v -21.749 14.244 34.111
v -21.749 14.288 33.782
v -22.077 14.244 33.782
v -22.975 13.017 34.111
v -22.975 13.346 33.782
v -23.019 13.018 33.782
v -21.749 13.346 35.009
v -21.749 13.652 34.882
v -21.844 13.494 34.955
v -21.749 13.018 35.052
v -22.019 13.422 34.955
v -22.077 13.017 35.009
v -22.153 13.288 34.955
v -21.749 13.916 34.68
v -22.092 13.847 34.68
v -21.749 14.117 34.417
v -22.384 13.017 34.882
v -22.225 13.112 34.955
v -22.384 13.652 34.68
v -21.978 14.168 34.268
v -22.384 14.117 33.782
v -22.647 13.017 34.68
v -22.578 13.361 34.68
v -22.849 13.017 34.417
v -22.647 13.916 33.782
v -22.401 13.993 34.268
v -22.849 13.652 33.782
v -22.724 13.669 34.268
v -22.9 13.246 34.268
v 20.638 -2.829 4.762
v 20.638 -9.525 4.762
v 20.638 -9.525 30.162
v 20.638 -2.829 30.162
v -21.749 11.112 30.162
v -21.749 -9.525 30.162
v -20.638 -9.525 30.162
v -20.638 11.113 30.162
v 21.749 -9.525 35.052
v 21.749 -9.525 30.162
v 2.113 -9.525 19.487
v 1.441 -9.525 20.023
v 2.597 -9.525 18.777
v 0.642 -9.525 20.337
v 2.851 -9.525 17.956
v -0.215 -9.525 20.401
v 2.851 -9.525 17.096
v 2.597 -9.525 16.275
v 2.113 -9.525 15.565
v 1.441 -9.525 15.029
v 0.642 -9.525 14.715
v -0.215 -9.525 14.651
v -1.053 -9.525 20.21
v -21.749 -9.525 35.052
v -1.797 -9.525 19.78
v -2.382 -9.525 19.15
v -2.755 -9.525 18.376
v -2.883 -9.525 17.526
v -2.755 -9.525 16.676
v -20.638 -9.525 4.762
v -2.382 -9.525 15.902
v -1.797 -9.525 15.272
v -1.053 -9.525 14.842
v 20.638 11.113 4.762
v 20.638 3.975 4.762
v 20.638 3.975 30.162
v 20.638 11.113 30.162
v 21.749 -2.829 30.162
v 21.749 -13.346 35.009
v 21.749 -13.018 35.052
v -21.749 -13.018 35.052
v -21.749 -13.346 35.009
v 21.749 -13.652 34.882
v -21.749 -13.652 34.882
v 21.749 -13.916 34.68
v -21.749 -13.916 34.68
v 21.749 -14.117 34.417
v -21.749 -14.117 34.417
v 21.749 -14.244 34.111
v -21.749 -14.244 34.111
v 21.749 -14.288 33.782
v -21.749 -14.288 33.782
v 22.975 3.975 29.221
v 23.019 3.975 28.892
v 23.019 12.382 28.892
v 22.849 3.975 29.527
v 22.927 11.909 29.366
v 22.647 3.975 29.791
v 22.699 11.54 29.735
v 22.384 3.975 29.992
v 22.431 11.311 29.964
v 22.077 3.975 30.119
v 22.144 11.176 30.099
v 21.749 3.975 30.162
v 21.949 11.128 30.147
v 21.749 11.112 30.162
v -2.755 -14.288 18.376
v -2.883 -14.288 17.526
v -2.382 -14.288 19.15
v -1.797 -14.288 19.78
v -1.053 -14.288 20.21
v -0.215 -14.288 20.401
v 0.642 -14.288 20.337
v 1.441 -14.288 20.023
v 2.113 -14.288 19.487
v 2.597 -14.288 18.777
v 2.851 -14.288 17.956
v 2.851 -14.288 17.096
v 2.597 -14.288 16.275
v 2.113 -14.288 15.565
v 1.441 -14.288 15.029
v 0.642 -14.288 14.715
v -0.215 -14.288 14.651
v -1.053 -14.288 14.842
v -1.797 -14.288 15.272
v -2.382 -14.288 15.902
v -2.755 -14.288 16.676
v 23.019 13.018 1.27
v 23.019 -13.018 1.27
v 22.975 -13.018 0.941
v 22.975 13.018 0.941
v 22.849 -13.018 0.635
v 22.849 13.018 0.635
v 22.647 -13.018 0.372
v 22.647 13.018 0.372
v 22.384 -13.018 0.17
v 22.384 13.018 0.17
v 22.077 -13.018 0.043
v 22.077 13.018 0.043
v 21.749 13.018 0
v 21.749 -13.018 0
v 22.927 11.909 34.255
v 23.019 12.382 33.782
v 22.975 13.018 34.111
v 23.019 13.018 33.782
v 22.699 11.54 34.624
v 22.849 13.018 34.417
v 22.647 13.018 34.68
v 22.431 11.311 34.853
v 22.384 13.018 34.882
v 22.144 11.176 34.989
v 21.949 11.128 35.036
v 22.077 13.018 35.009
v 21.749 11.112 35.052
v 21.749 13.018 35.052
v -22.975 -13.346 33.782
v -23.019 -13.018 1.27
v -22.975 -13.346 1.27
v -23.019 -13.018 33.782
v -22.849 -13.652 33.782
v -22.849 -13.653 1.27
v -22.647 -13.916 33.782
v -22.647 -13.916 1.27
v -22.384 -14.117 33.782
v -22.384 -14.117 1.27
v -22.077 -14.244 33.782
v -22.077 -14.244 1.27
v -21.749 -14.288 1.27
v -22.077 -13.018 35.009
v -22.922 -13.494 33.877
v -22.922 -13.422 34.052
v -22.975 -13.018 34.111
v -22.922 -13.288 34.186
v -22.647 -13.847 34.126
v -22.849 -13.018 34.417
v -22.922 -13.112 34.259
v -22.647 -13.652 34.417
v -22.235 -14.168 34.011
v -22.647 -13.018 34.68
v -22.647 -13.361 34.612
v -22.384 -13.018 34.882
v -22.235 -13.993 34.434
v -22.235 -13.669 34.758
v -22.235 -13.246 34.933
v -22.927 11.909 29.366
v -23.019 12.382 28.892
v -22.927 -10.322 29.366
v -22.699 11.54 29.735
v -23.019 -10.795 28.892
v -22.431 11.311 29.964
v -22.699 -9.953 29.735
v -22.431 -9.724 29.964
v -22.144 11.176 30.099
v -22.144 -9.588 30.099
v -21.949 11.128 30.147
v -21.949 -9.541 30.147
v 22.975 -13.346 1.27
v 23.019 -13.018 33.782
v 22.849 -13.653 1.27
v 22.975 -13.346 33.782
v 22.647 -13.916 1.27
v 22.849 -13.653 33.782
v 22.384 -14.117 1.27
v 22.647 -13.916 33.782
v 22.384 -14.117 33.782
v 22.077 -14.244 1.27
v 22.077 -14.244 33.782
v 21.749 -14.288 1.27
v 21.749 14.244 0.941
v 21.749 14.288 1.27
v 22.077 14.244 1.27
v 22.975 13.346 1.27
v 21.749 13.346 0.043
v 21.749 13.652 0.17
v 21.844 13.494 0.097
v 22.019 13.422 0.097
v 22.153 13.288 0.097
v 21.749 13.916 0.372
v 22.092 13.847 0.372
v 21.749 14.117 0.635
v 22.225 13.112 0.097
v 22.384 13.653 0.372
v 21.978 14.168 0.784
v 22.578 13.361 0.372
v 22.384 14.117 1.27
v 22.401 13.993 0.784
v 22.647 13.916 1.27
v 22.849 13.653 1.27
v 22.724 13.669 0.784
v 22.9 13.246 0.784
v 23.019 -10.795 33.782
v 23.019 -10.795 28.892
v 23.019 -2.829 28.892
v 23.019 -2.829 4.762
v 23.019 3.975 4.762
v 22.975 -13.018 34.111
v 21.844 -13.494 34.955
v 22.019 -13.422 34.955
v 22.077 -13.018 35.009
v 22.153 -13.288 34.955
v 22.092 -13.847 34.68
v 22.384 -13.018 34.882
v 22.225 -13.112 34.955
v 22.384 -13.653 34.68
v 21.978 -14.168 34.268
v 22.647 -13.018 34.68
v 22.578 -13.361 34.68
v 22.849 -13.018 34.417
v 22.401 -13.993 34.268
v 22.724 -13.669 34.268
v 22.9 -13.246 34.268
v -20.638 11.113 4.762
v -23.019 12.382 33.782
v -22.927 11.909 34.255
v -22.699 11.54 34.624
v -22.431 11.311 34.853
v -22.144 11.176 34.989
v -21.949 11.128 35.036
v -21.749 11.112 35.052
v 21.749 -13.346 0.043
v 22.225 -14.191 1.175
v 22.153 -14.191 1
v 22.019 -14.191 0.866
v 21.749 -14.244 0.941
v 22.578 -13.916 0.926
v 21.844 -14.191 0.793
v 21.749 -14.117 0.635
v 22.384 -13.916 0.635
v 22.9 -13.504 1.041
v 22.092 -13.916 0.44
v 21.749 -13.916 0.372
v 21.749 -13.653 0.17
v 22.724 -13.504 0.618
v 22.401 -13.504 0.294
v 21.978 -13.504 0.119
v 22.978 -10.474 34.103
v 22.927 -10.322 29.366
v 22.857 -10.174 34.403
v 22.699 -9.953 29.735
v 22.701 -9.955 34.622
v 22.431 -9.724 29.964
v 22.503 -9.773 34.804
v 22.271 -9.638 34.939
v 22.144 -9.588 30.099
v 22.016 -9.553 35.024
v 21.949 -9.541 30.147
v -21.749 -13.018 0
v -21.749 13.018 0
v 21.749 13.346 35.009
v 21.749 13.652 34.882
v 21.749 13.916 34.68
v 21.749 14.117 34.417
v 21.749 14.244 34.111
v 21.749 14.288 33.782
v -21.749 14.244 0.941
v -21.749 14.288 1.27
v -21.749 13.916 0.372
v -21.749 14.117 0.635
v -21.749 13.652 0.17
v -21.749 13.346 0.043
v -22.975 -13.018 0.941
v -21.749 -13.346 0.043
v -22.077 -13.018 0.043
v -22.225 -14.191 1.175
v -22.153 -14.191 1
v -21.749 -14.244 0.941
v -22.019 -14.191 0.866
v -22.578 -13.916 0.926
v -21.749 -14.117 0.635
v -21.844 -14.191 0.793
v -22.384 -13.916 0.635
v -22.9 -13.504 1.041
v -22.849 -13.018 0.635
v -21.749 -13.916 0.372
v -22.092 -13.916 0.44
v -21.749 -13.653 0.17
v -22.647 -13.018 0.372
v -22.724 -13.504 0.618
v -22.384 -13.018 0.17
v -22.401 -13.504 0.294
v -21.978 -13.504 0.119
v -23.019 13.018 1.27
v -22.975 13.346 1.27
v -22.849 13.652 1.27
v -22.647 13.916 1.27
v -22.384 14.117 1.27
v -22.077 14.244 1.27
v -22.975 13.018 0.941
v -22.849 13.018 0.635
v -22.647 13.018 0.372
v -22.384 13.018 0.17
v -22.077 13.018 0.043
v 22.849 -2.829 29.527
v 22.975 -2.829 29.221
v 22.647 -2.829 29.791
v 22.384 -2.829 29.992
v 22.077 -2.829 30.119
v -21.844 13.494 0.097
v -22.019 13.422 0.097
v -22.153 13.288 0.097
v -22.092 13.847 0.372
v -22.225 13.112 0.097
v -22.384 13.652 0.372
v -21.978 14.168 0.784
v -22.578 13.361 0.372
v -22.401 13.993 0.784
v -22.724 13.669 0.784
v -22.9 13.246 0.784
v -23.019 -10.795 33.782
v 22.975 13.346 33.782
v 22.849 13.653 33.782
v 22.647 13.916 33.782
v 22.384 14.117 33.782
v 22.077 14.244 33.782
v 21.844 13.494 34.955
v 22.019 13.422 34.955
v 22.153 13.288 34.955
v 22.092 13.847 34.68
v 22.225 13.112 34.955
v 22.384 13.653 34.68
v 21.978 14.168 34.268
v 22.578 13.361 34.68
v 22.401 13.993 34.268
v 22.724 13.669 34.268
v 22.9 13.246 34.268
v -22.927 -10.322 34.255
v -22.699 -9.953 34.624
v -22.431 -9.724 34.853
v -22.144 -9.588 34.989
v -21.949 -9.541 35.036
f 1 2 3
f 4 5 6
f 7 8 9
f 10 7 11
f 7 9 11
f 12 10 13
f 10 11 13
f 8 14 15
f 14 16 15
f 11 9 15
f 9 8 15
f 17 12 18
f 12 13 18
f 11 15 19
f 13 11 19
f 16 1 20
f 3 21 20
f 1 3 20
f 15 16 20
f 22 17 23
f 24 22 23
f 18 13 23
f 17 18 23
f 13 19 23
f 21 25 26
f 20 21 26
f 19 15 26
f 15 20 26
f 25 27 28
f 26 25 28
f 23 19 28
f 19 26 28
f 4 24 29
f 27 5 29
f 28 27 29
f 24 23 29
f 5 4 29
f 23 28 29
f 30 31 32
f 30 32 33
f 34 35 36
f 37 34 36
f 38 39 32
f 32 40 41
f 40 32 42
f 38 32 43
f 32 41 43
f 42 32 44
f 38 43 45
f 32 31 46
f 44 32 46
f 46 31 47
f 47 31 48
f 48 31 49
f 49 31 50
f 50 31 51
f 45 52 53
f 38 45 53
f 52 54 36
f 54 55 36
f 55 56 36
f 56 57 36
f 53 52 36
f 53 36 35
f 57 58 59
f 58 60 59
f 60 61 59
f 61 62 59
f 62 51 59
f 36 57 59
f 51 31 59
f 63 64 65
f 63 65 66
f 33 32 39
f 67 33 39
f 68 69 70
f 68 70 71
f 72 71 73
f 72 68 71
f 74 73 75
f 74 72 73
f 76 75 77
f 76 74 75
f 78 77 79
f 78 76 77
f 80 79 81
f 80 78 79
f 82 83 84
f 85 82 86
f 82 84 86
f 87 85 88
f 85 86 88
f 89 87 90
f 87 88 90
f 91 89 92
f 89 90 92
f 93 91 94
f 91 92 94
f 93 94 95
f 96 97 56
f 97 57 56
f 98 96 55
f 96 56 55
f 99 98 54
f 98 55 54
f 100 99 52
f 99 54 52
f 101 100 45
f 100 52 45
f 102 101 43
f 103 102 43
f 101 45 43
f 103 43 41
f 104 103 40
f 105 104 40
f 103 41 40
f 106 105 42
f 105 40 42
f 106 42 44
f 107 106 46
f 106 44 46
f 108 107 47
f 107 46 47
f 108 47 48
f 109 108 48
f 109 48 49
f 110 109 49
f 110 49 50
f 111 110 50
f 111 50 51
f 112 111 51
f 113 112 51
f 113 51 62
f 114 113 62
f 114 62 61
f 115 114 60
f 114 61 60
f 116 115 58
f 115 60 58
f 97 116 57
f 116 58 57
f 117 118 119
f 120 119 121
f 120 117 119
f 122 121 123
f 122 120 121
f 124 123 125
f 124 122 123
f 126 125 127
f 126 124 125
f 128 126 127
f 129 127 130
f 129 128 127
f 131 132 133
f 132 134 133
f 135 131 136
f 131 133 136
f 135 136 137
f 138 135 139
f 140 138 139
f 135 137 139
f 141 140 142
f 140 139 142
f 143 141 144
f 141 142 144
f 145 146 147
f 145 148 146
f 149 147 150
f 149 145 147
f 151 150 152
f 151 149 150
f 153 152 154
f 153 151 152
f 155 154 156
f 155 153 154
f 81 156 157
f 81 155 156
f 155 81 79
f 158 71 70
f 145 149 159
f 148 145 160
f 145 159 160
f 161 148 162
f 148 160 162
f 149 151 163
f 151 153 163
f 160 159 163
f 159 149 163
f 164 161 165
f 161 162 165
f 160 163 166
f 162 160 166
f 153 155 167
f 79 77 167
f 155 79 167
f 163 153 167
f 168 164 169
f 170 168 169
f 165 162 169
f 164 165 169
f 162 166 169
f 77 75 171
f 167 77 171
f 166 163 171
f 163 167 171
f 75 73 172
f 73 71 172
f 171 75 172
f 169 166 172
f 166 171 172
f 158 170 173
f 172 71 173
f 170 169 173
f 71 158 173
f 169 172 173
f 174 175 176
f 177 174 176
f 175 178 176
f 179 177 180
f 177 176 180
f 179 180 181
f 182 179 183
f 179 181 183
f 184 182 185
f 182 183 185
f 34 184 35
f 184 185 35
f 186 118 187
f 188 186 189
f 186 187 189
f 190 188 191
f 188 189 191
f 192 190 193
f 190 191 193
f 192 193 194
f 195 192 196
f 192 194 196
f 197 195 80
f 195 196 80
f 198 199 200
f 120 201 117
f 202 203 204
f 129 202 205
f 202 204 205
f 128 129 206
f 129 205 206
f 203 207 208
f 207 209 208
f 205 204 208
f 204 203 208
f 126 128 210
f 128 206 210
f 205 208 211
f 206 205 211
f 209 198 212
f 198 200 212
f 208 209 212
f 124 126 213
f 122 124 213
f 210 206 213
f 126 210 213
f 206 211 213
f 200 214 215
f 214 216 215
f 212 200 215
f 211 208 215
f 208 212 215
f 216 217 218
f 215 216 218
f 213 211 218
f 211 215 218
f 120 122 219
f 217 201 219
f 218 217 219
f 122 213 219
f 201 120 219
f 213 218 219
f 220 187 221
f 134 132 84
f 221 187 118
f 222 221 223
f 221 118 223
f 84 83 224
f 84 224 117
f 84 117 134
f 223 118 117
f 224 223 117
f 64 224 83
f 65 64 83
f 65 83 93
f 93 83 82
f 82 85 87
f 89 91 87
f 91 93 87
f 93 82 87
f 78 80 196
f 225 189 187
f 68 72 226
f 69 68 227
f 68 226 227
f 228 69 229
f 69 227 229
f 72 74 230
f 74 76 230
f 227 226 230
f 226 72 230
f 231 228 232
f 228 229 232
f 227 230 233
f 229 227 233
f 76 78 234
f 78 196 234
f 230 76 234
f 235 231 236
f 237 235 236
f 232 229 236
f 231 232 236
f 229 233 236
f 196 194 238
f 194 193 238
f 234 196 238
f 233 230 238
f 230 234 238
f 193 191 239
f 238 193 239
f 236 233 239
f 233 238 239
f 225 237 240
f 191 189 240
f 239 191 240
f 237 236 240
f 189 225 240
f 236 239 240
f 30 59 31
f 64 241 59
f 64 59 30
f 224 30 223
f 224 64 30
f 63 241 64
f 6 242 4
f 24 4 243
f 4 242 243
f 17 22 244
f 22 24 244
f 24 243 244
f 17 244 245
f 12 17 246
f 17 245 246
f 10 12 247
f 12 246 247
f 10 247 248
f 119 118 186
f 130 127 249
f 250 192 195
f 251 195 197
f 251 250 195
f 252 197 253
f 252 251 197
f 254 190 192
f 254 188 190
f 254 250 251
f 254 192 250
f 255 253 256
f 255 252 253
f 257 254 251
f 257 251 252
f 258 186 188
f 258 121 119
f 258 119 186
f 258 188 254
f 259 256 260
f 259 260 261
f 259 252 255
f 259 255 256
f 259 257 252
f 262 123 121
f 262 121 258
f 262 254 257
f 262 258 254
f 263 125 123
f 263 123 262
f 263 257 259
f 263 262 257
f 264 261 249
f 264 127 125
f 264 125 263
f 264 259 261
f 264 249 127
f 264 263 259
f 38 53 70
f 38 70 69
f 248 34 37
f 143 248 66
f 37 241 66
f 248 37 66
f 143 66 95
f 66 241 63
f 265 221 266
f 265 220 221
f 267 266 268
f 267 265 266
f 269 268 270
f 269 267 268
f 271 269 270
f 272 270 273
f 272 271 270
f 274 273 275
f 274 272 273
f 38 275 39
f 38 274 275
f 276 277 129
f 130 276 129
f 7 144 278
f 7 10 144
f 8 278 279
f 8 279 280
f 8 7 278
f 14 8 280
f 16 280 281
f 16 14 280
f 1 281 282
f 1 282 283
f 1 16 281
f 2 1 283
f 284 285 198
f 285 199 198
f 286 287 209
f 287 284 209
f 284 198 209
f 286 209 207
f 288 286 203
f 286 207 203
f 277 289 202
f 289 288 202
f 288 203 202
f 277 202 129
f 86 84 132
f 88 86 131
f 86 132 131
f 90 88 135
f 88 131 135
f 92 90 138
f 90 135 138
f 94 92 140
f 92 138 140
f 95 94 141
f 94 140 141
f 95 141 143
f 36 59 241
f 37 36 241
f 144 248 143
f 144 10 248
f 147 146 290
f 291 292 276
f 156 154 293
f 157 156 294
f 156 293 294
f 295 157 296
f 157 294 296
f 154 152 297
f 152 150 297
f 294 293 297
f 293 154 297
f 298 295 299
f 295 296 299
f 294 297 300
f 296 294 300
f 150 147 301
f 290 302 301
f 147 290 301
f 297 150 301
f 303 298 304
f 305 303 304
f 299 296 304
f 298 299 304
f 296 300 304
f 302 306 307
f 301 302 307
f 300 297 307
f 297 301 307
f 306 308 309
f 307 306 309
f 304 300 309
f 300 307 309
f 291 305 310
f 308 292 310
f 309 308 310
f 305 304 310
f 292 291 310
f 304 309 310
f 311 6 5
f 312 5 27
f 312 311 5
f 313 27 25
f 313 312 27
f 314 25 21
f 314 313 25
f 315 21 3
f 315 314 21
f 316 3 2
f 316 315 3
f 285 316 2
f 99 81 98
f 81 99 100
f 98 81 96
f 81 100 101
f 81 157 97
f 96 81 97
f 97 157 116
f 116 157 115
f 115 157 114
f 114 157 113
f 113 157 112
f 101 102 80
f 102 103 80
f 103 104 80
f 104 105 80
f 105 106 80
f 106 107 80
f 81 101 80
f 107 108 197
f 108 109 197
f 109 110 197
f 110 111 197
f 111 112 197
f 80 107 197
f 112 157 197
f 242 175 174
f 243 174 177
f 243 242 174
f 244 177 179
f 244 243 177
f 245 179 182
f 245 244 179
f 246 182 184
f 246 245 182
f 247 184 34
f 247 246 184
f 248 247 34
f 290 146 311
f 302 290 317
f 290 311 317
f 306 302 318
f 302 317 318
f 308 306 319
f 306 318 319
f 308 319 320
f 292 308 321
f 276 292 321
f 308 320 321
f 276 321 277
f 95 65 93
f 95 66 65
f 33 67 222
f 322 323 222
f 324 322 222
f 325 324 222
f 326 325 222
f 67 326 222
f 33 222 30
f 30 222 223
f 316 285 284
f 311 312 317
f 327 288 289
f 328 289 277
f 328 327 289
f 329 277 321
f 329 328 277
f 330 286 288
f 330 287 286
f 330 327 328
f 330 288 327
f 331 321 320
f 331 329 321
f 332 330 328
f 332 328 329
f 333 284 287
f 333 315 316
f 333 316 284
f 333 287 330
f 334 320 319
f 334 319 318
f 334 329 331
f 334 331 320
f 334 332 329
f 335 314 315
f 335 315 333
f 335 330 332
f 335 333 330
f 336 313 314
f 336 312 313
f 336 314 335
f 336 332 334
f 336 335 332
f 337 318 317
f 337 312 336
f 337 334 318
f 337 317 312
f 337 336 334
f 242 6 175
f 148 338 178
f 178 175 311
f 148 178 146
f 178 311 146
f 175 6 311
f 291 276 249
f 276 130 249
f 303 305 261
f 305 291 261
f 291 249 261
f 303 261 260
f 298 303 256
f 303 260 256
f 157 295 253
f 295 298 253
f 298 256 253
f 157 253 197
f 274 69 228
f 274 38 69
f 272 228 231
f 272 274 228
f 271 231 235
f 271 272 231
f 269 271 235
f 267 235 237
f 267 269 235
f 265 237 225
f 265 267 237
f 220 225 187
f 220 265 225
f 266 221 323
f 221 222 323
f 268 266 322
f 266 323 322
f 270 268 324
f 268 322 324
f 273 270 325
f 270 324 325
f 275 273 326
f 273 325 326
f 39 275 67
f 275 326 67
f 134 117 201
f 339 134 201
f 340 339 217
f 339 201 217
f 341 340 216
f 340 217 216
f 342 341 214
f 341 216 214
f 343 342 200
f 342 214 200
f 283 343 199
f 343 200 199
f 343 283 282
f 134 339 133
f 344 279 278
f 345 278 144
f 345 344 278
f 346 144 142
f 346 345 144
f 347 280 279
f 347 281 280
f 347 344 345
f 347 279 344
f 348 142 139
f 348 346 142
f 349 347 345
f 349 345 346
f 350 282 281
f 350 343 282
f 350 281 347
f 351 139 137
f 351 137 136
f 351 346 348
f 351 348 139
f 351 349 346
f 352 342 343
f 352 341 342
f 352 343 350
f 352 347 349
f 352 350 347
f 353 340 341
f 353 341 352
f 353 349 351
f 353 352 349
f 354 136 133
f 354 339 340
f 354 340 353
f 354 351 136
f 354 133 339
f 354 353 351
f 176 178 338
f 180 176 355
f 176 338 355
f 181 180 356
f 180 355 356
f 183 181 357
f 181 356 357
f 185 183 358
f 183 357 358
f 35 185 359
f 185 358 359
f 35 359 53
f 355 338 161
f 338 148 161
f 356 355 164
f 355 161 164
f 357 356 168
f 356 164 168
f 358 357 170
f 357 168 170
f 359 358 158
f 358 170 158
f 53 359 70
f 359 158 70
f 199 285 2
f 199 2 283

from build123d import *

# Parameters (mm, degrees)
F0_W     = 46.0375
F0_H     = 28.575
F1_DEPTH = 4.7625
F3_DEPTH = 30.2895
F2_W     = 2.38125
F2_H     = 20.6375
F4_DEPTH = 25.4
F6_DEPTH = 2.38125
F8_D     = 5.7658
F8_DEPTH = 4.7625
F8_TIP   = 1.7322210786
F9_R     = 1.27


# Not quite as in the source:
# - a feature names something its author has since deleted; it is built from what else it names


with BuildPart() as f1:
    # F0 (on Top) → F1 (new body)
    with BuildSketch(Plane.XY):
        Rectangle(F0_W, F0_H)
    extrude(amount=F1_DEPTH)

    # F2 (on face) → F3 (join)
    with BuildSketch(Plane.XY.offset(4.7625)):
        Polygon((-23.01875, -9.525), (-23.01875, -14.2875), (23.01875, -14.2875), (23.01875, -9.525), (20.6375, -9.525), (-20.6375, -9.525), align=None)
        Polygon((-23.01875, 14.2875), (-23.01875, 11.1125), (-20.6375, 11.1125), (20.6375, 11.1125), (23.01875, 11.1125), (23.01875, 14.2875), align=None)
    extrude(amount=F3_DEPTH)

    # F2 (on face) → F4 (join)
    with BuildSketch(Plane.XY.offset(4.7625)):
        Polygon((-23.01875, -9.525), (-23.01875, -14.2875), (23.01875, -14.2875), (23.01875, -9.525), (20.6375, -9.525), (-20.6375, -9.525), align=None)
        with Locations((-21.828125, 0.79375)):
            Rectangle(F2_W, F2_H)
        with Locations((21.828125, 0.79375)):
            Rectangle(F2_W, F2_H)
        Polygon((-23.01875, 14.2875), (-23.01875, 11.1125), (-20.6375, 11.1125), (20.6375, 11.1125), (23.01875, 11.1125), (23.01875, 14.2875), align=None)
    extrude(amount=F4_DEPTH)

    # F5 (on face) → F6 (cut, through all)
    with BuildSketch(Plane.YZ.offset(23.01875)):
        Polygon((3.9749178039, 30.1625), (0.3463463753, 30.1625), (-2.8286536247, 30.1625), (-2.8286536247, 16.5712326925), (-2.8286536247, 11.8087326925), (-2.8286536247, 4.7625), (0.3463463753, 4.7625), (3.9749178039, 4.7625), (3.9749178039, 16.5712326925), align=None)
    extrude(amount=-F6_DEPTH, mode=Mode.SUBTRACT)

    # F8
    with Locations(Plane.XZ.offset(14.2875)):
        with Locations((0, 17.526)):
            Hole(F8_D / 2, depth=F8_DEPTH)
            with Locations((0, 0, -(F8_DEPTH + F8_TIP / 2))):  # 118° drill point
                Cone(0, F8_D / 2, F8_TIP, mode=Mode.SUBTRACT)

    # F9
    f9_edges = [f1.edges().sort_by_distance(p)[0] for p in [
        (23.01875, 14.2875, 17.526),
        (-23.01875, 14.2875, 17.526),
        (0, 14.2875, 35.052),
        (0, 14.2875, 0),
        (23.01875, 0, 0),
        (-23.01875, 0, 0),
        (23.01875, 12.7, 35.052),
        (-23.01875, 12.7, 35.052),
        (23.01875, -14.2875, 17.526),
        (0, -14.2875, 35.052),
        (-23.01875, -14.2875, 17.526),
        (0, -14.2875, 0),
        (23.01875, -11.90625, 35.052),
        (-23.01875, -11.90625, 35.052),
        (-23.01875, 0.79375, 30.1625),
        (23.01875, 7.543709, 30.1625),
        (23.01875, -6.176827, 30.1625),
        (23.01875, -9.525, 32.60725),
        (-23.01875, -9.525, 32.60725),
        (-23.01875, 11.1125, 32.60725),
        (23.01875, 11.1125, 32.60725),
    ]]
    fillet(f9_edges, radius=F9_R)


solid = f1.part
